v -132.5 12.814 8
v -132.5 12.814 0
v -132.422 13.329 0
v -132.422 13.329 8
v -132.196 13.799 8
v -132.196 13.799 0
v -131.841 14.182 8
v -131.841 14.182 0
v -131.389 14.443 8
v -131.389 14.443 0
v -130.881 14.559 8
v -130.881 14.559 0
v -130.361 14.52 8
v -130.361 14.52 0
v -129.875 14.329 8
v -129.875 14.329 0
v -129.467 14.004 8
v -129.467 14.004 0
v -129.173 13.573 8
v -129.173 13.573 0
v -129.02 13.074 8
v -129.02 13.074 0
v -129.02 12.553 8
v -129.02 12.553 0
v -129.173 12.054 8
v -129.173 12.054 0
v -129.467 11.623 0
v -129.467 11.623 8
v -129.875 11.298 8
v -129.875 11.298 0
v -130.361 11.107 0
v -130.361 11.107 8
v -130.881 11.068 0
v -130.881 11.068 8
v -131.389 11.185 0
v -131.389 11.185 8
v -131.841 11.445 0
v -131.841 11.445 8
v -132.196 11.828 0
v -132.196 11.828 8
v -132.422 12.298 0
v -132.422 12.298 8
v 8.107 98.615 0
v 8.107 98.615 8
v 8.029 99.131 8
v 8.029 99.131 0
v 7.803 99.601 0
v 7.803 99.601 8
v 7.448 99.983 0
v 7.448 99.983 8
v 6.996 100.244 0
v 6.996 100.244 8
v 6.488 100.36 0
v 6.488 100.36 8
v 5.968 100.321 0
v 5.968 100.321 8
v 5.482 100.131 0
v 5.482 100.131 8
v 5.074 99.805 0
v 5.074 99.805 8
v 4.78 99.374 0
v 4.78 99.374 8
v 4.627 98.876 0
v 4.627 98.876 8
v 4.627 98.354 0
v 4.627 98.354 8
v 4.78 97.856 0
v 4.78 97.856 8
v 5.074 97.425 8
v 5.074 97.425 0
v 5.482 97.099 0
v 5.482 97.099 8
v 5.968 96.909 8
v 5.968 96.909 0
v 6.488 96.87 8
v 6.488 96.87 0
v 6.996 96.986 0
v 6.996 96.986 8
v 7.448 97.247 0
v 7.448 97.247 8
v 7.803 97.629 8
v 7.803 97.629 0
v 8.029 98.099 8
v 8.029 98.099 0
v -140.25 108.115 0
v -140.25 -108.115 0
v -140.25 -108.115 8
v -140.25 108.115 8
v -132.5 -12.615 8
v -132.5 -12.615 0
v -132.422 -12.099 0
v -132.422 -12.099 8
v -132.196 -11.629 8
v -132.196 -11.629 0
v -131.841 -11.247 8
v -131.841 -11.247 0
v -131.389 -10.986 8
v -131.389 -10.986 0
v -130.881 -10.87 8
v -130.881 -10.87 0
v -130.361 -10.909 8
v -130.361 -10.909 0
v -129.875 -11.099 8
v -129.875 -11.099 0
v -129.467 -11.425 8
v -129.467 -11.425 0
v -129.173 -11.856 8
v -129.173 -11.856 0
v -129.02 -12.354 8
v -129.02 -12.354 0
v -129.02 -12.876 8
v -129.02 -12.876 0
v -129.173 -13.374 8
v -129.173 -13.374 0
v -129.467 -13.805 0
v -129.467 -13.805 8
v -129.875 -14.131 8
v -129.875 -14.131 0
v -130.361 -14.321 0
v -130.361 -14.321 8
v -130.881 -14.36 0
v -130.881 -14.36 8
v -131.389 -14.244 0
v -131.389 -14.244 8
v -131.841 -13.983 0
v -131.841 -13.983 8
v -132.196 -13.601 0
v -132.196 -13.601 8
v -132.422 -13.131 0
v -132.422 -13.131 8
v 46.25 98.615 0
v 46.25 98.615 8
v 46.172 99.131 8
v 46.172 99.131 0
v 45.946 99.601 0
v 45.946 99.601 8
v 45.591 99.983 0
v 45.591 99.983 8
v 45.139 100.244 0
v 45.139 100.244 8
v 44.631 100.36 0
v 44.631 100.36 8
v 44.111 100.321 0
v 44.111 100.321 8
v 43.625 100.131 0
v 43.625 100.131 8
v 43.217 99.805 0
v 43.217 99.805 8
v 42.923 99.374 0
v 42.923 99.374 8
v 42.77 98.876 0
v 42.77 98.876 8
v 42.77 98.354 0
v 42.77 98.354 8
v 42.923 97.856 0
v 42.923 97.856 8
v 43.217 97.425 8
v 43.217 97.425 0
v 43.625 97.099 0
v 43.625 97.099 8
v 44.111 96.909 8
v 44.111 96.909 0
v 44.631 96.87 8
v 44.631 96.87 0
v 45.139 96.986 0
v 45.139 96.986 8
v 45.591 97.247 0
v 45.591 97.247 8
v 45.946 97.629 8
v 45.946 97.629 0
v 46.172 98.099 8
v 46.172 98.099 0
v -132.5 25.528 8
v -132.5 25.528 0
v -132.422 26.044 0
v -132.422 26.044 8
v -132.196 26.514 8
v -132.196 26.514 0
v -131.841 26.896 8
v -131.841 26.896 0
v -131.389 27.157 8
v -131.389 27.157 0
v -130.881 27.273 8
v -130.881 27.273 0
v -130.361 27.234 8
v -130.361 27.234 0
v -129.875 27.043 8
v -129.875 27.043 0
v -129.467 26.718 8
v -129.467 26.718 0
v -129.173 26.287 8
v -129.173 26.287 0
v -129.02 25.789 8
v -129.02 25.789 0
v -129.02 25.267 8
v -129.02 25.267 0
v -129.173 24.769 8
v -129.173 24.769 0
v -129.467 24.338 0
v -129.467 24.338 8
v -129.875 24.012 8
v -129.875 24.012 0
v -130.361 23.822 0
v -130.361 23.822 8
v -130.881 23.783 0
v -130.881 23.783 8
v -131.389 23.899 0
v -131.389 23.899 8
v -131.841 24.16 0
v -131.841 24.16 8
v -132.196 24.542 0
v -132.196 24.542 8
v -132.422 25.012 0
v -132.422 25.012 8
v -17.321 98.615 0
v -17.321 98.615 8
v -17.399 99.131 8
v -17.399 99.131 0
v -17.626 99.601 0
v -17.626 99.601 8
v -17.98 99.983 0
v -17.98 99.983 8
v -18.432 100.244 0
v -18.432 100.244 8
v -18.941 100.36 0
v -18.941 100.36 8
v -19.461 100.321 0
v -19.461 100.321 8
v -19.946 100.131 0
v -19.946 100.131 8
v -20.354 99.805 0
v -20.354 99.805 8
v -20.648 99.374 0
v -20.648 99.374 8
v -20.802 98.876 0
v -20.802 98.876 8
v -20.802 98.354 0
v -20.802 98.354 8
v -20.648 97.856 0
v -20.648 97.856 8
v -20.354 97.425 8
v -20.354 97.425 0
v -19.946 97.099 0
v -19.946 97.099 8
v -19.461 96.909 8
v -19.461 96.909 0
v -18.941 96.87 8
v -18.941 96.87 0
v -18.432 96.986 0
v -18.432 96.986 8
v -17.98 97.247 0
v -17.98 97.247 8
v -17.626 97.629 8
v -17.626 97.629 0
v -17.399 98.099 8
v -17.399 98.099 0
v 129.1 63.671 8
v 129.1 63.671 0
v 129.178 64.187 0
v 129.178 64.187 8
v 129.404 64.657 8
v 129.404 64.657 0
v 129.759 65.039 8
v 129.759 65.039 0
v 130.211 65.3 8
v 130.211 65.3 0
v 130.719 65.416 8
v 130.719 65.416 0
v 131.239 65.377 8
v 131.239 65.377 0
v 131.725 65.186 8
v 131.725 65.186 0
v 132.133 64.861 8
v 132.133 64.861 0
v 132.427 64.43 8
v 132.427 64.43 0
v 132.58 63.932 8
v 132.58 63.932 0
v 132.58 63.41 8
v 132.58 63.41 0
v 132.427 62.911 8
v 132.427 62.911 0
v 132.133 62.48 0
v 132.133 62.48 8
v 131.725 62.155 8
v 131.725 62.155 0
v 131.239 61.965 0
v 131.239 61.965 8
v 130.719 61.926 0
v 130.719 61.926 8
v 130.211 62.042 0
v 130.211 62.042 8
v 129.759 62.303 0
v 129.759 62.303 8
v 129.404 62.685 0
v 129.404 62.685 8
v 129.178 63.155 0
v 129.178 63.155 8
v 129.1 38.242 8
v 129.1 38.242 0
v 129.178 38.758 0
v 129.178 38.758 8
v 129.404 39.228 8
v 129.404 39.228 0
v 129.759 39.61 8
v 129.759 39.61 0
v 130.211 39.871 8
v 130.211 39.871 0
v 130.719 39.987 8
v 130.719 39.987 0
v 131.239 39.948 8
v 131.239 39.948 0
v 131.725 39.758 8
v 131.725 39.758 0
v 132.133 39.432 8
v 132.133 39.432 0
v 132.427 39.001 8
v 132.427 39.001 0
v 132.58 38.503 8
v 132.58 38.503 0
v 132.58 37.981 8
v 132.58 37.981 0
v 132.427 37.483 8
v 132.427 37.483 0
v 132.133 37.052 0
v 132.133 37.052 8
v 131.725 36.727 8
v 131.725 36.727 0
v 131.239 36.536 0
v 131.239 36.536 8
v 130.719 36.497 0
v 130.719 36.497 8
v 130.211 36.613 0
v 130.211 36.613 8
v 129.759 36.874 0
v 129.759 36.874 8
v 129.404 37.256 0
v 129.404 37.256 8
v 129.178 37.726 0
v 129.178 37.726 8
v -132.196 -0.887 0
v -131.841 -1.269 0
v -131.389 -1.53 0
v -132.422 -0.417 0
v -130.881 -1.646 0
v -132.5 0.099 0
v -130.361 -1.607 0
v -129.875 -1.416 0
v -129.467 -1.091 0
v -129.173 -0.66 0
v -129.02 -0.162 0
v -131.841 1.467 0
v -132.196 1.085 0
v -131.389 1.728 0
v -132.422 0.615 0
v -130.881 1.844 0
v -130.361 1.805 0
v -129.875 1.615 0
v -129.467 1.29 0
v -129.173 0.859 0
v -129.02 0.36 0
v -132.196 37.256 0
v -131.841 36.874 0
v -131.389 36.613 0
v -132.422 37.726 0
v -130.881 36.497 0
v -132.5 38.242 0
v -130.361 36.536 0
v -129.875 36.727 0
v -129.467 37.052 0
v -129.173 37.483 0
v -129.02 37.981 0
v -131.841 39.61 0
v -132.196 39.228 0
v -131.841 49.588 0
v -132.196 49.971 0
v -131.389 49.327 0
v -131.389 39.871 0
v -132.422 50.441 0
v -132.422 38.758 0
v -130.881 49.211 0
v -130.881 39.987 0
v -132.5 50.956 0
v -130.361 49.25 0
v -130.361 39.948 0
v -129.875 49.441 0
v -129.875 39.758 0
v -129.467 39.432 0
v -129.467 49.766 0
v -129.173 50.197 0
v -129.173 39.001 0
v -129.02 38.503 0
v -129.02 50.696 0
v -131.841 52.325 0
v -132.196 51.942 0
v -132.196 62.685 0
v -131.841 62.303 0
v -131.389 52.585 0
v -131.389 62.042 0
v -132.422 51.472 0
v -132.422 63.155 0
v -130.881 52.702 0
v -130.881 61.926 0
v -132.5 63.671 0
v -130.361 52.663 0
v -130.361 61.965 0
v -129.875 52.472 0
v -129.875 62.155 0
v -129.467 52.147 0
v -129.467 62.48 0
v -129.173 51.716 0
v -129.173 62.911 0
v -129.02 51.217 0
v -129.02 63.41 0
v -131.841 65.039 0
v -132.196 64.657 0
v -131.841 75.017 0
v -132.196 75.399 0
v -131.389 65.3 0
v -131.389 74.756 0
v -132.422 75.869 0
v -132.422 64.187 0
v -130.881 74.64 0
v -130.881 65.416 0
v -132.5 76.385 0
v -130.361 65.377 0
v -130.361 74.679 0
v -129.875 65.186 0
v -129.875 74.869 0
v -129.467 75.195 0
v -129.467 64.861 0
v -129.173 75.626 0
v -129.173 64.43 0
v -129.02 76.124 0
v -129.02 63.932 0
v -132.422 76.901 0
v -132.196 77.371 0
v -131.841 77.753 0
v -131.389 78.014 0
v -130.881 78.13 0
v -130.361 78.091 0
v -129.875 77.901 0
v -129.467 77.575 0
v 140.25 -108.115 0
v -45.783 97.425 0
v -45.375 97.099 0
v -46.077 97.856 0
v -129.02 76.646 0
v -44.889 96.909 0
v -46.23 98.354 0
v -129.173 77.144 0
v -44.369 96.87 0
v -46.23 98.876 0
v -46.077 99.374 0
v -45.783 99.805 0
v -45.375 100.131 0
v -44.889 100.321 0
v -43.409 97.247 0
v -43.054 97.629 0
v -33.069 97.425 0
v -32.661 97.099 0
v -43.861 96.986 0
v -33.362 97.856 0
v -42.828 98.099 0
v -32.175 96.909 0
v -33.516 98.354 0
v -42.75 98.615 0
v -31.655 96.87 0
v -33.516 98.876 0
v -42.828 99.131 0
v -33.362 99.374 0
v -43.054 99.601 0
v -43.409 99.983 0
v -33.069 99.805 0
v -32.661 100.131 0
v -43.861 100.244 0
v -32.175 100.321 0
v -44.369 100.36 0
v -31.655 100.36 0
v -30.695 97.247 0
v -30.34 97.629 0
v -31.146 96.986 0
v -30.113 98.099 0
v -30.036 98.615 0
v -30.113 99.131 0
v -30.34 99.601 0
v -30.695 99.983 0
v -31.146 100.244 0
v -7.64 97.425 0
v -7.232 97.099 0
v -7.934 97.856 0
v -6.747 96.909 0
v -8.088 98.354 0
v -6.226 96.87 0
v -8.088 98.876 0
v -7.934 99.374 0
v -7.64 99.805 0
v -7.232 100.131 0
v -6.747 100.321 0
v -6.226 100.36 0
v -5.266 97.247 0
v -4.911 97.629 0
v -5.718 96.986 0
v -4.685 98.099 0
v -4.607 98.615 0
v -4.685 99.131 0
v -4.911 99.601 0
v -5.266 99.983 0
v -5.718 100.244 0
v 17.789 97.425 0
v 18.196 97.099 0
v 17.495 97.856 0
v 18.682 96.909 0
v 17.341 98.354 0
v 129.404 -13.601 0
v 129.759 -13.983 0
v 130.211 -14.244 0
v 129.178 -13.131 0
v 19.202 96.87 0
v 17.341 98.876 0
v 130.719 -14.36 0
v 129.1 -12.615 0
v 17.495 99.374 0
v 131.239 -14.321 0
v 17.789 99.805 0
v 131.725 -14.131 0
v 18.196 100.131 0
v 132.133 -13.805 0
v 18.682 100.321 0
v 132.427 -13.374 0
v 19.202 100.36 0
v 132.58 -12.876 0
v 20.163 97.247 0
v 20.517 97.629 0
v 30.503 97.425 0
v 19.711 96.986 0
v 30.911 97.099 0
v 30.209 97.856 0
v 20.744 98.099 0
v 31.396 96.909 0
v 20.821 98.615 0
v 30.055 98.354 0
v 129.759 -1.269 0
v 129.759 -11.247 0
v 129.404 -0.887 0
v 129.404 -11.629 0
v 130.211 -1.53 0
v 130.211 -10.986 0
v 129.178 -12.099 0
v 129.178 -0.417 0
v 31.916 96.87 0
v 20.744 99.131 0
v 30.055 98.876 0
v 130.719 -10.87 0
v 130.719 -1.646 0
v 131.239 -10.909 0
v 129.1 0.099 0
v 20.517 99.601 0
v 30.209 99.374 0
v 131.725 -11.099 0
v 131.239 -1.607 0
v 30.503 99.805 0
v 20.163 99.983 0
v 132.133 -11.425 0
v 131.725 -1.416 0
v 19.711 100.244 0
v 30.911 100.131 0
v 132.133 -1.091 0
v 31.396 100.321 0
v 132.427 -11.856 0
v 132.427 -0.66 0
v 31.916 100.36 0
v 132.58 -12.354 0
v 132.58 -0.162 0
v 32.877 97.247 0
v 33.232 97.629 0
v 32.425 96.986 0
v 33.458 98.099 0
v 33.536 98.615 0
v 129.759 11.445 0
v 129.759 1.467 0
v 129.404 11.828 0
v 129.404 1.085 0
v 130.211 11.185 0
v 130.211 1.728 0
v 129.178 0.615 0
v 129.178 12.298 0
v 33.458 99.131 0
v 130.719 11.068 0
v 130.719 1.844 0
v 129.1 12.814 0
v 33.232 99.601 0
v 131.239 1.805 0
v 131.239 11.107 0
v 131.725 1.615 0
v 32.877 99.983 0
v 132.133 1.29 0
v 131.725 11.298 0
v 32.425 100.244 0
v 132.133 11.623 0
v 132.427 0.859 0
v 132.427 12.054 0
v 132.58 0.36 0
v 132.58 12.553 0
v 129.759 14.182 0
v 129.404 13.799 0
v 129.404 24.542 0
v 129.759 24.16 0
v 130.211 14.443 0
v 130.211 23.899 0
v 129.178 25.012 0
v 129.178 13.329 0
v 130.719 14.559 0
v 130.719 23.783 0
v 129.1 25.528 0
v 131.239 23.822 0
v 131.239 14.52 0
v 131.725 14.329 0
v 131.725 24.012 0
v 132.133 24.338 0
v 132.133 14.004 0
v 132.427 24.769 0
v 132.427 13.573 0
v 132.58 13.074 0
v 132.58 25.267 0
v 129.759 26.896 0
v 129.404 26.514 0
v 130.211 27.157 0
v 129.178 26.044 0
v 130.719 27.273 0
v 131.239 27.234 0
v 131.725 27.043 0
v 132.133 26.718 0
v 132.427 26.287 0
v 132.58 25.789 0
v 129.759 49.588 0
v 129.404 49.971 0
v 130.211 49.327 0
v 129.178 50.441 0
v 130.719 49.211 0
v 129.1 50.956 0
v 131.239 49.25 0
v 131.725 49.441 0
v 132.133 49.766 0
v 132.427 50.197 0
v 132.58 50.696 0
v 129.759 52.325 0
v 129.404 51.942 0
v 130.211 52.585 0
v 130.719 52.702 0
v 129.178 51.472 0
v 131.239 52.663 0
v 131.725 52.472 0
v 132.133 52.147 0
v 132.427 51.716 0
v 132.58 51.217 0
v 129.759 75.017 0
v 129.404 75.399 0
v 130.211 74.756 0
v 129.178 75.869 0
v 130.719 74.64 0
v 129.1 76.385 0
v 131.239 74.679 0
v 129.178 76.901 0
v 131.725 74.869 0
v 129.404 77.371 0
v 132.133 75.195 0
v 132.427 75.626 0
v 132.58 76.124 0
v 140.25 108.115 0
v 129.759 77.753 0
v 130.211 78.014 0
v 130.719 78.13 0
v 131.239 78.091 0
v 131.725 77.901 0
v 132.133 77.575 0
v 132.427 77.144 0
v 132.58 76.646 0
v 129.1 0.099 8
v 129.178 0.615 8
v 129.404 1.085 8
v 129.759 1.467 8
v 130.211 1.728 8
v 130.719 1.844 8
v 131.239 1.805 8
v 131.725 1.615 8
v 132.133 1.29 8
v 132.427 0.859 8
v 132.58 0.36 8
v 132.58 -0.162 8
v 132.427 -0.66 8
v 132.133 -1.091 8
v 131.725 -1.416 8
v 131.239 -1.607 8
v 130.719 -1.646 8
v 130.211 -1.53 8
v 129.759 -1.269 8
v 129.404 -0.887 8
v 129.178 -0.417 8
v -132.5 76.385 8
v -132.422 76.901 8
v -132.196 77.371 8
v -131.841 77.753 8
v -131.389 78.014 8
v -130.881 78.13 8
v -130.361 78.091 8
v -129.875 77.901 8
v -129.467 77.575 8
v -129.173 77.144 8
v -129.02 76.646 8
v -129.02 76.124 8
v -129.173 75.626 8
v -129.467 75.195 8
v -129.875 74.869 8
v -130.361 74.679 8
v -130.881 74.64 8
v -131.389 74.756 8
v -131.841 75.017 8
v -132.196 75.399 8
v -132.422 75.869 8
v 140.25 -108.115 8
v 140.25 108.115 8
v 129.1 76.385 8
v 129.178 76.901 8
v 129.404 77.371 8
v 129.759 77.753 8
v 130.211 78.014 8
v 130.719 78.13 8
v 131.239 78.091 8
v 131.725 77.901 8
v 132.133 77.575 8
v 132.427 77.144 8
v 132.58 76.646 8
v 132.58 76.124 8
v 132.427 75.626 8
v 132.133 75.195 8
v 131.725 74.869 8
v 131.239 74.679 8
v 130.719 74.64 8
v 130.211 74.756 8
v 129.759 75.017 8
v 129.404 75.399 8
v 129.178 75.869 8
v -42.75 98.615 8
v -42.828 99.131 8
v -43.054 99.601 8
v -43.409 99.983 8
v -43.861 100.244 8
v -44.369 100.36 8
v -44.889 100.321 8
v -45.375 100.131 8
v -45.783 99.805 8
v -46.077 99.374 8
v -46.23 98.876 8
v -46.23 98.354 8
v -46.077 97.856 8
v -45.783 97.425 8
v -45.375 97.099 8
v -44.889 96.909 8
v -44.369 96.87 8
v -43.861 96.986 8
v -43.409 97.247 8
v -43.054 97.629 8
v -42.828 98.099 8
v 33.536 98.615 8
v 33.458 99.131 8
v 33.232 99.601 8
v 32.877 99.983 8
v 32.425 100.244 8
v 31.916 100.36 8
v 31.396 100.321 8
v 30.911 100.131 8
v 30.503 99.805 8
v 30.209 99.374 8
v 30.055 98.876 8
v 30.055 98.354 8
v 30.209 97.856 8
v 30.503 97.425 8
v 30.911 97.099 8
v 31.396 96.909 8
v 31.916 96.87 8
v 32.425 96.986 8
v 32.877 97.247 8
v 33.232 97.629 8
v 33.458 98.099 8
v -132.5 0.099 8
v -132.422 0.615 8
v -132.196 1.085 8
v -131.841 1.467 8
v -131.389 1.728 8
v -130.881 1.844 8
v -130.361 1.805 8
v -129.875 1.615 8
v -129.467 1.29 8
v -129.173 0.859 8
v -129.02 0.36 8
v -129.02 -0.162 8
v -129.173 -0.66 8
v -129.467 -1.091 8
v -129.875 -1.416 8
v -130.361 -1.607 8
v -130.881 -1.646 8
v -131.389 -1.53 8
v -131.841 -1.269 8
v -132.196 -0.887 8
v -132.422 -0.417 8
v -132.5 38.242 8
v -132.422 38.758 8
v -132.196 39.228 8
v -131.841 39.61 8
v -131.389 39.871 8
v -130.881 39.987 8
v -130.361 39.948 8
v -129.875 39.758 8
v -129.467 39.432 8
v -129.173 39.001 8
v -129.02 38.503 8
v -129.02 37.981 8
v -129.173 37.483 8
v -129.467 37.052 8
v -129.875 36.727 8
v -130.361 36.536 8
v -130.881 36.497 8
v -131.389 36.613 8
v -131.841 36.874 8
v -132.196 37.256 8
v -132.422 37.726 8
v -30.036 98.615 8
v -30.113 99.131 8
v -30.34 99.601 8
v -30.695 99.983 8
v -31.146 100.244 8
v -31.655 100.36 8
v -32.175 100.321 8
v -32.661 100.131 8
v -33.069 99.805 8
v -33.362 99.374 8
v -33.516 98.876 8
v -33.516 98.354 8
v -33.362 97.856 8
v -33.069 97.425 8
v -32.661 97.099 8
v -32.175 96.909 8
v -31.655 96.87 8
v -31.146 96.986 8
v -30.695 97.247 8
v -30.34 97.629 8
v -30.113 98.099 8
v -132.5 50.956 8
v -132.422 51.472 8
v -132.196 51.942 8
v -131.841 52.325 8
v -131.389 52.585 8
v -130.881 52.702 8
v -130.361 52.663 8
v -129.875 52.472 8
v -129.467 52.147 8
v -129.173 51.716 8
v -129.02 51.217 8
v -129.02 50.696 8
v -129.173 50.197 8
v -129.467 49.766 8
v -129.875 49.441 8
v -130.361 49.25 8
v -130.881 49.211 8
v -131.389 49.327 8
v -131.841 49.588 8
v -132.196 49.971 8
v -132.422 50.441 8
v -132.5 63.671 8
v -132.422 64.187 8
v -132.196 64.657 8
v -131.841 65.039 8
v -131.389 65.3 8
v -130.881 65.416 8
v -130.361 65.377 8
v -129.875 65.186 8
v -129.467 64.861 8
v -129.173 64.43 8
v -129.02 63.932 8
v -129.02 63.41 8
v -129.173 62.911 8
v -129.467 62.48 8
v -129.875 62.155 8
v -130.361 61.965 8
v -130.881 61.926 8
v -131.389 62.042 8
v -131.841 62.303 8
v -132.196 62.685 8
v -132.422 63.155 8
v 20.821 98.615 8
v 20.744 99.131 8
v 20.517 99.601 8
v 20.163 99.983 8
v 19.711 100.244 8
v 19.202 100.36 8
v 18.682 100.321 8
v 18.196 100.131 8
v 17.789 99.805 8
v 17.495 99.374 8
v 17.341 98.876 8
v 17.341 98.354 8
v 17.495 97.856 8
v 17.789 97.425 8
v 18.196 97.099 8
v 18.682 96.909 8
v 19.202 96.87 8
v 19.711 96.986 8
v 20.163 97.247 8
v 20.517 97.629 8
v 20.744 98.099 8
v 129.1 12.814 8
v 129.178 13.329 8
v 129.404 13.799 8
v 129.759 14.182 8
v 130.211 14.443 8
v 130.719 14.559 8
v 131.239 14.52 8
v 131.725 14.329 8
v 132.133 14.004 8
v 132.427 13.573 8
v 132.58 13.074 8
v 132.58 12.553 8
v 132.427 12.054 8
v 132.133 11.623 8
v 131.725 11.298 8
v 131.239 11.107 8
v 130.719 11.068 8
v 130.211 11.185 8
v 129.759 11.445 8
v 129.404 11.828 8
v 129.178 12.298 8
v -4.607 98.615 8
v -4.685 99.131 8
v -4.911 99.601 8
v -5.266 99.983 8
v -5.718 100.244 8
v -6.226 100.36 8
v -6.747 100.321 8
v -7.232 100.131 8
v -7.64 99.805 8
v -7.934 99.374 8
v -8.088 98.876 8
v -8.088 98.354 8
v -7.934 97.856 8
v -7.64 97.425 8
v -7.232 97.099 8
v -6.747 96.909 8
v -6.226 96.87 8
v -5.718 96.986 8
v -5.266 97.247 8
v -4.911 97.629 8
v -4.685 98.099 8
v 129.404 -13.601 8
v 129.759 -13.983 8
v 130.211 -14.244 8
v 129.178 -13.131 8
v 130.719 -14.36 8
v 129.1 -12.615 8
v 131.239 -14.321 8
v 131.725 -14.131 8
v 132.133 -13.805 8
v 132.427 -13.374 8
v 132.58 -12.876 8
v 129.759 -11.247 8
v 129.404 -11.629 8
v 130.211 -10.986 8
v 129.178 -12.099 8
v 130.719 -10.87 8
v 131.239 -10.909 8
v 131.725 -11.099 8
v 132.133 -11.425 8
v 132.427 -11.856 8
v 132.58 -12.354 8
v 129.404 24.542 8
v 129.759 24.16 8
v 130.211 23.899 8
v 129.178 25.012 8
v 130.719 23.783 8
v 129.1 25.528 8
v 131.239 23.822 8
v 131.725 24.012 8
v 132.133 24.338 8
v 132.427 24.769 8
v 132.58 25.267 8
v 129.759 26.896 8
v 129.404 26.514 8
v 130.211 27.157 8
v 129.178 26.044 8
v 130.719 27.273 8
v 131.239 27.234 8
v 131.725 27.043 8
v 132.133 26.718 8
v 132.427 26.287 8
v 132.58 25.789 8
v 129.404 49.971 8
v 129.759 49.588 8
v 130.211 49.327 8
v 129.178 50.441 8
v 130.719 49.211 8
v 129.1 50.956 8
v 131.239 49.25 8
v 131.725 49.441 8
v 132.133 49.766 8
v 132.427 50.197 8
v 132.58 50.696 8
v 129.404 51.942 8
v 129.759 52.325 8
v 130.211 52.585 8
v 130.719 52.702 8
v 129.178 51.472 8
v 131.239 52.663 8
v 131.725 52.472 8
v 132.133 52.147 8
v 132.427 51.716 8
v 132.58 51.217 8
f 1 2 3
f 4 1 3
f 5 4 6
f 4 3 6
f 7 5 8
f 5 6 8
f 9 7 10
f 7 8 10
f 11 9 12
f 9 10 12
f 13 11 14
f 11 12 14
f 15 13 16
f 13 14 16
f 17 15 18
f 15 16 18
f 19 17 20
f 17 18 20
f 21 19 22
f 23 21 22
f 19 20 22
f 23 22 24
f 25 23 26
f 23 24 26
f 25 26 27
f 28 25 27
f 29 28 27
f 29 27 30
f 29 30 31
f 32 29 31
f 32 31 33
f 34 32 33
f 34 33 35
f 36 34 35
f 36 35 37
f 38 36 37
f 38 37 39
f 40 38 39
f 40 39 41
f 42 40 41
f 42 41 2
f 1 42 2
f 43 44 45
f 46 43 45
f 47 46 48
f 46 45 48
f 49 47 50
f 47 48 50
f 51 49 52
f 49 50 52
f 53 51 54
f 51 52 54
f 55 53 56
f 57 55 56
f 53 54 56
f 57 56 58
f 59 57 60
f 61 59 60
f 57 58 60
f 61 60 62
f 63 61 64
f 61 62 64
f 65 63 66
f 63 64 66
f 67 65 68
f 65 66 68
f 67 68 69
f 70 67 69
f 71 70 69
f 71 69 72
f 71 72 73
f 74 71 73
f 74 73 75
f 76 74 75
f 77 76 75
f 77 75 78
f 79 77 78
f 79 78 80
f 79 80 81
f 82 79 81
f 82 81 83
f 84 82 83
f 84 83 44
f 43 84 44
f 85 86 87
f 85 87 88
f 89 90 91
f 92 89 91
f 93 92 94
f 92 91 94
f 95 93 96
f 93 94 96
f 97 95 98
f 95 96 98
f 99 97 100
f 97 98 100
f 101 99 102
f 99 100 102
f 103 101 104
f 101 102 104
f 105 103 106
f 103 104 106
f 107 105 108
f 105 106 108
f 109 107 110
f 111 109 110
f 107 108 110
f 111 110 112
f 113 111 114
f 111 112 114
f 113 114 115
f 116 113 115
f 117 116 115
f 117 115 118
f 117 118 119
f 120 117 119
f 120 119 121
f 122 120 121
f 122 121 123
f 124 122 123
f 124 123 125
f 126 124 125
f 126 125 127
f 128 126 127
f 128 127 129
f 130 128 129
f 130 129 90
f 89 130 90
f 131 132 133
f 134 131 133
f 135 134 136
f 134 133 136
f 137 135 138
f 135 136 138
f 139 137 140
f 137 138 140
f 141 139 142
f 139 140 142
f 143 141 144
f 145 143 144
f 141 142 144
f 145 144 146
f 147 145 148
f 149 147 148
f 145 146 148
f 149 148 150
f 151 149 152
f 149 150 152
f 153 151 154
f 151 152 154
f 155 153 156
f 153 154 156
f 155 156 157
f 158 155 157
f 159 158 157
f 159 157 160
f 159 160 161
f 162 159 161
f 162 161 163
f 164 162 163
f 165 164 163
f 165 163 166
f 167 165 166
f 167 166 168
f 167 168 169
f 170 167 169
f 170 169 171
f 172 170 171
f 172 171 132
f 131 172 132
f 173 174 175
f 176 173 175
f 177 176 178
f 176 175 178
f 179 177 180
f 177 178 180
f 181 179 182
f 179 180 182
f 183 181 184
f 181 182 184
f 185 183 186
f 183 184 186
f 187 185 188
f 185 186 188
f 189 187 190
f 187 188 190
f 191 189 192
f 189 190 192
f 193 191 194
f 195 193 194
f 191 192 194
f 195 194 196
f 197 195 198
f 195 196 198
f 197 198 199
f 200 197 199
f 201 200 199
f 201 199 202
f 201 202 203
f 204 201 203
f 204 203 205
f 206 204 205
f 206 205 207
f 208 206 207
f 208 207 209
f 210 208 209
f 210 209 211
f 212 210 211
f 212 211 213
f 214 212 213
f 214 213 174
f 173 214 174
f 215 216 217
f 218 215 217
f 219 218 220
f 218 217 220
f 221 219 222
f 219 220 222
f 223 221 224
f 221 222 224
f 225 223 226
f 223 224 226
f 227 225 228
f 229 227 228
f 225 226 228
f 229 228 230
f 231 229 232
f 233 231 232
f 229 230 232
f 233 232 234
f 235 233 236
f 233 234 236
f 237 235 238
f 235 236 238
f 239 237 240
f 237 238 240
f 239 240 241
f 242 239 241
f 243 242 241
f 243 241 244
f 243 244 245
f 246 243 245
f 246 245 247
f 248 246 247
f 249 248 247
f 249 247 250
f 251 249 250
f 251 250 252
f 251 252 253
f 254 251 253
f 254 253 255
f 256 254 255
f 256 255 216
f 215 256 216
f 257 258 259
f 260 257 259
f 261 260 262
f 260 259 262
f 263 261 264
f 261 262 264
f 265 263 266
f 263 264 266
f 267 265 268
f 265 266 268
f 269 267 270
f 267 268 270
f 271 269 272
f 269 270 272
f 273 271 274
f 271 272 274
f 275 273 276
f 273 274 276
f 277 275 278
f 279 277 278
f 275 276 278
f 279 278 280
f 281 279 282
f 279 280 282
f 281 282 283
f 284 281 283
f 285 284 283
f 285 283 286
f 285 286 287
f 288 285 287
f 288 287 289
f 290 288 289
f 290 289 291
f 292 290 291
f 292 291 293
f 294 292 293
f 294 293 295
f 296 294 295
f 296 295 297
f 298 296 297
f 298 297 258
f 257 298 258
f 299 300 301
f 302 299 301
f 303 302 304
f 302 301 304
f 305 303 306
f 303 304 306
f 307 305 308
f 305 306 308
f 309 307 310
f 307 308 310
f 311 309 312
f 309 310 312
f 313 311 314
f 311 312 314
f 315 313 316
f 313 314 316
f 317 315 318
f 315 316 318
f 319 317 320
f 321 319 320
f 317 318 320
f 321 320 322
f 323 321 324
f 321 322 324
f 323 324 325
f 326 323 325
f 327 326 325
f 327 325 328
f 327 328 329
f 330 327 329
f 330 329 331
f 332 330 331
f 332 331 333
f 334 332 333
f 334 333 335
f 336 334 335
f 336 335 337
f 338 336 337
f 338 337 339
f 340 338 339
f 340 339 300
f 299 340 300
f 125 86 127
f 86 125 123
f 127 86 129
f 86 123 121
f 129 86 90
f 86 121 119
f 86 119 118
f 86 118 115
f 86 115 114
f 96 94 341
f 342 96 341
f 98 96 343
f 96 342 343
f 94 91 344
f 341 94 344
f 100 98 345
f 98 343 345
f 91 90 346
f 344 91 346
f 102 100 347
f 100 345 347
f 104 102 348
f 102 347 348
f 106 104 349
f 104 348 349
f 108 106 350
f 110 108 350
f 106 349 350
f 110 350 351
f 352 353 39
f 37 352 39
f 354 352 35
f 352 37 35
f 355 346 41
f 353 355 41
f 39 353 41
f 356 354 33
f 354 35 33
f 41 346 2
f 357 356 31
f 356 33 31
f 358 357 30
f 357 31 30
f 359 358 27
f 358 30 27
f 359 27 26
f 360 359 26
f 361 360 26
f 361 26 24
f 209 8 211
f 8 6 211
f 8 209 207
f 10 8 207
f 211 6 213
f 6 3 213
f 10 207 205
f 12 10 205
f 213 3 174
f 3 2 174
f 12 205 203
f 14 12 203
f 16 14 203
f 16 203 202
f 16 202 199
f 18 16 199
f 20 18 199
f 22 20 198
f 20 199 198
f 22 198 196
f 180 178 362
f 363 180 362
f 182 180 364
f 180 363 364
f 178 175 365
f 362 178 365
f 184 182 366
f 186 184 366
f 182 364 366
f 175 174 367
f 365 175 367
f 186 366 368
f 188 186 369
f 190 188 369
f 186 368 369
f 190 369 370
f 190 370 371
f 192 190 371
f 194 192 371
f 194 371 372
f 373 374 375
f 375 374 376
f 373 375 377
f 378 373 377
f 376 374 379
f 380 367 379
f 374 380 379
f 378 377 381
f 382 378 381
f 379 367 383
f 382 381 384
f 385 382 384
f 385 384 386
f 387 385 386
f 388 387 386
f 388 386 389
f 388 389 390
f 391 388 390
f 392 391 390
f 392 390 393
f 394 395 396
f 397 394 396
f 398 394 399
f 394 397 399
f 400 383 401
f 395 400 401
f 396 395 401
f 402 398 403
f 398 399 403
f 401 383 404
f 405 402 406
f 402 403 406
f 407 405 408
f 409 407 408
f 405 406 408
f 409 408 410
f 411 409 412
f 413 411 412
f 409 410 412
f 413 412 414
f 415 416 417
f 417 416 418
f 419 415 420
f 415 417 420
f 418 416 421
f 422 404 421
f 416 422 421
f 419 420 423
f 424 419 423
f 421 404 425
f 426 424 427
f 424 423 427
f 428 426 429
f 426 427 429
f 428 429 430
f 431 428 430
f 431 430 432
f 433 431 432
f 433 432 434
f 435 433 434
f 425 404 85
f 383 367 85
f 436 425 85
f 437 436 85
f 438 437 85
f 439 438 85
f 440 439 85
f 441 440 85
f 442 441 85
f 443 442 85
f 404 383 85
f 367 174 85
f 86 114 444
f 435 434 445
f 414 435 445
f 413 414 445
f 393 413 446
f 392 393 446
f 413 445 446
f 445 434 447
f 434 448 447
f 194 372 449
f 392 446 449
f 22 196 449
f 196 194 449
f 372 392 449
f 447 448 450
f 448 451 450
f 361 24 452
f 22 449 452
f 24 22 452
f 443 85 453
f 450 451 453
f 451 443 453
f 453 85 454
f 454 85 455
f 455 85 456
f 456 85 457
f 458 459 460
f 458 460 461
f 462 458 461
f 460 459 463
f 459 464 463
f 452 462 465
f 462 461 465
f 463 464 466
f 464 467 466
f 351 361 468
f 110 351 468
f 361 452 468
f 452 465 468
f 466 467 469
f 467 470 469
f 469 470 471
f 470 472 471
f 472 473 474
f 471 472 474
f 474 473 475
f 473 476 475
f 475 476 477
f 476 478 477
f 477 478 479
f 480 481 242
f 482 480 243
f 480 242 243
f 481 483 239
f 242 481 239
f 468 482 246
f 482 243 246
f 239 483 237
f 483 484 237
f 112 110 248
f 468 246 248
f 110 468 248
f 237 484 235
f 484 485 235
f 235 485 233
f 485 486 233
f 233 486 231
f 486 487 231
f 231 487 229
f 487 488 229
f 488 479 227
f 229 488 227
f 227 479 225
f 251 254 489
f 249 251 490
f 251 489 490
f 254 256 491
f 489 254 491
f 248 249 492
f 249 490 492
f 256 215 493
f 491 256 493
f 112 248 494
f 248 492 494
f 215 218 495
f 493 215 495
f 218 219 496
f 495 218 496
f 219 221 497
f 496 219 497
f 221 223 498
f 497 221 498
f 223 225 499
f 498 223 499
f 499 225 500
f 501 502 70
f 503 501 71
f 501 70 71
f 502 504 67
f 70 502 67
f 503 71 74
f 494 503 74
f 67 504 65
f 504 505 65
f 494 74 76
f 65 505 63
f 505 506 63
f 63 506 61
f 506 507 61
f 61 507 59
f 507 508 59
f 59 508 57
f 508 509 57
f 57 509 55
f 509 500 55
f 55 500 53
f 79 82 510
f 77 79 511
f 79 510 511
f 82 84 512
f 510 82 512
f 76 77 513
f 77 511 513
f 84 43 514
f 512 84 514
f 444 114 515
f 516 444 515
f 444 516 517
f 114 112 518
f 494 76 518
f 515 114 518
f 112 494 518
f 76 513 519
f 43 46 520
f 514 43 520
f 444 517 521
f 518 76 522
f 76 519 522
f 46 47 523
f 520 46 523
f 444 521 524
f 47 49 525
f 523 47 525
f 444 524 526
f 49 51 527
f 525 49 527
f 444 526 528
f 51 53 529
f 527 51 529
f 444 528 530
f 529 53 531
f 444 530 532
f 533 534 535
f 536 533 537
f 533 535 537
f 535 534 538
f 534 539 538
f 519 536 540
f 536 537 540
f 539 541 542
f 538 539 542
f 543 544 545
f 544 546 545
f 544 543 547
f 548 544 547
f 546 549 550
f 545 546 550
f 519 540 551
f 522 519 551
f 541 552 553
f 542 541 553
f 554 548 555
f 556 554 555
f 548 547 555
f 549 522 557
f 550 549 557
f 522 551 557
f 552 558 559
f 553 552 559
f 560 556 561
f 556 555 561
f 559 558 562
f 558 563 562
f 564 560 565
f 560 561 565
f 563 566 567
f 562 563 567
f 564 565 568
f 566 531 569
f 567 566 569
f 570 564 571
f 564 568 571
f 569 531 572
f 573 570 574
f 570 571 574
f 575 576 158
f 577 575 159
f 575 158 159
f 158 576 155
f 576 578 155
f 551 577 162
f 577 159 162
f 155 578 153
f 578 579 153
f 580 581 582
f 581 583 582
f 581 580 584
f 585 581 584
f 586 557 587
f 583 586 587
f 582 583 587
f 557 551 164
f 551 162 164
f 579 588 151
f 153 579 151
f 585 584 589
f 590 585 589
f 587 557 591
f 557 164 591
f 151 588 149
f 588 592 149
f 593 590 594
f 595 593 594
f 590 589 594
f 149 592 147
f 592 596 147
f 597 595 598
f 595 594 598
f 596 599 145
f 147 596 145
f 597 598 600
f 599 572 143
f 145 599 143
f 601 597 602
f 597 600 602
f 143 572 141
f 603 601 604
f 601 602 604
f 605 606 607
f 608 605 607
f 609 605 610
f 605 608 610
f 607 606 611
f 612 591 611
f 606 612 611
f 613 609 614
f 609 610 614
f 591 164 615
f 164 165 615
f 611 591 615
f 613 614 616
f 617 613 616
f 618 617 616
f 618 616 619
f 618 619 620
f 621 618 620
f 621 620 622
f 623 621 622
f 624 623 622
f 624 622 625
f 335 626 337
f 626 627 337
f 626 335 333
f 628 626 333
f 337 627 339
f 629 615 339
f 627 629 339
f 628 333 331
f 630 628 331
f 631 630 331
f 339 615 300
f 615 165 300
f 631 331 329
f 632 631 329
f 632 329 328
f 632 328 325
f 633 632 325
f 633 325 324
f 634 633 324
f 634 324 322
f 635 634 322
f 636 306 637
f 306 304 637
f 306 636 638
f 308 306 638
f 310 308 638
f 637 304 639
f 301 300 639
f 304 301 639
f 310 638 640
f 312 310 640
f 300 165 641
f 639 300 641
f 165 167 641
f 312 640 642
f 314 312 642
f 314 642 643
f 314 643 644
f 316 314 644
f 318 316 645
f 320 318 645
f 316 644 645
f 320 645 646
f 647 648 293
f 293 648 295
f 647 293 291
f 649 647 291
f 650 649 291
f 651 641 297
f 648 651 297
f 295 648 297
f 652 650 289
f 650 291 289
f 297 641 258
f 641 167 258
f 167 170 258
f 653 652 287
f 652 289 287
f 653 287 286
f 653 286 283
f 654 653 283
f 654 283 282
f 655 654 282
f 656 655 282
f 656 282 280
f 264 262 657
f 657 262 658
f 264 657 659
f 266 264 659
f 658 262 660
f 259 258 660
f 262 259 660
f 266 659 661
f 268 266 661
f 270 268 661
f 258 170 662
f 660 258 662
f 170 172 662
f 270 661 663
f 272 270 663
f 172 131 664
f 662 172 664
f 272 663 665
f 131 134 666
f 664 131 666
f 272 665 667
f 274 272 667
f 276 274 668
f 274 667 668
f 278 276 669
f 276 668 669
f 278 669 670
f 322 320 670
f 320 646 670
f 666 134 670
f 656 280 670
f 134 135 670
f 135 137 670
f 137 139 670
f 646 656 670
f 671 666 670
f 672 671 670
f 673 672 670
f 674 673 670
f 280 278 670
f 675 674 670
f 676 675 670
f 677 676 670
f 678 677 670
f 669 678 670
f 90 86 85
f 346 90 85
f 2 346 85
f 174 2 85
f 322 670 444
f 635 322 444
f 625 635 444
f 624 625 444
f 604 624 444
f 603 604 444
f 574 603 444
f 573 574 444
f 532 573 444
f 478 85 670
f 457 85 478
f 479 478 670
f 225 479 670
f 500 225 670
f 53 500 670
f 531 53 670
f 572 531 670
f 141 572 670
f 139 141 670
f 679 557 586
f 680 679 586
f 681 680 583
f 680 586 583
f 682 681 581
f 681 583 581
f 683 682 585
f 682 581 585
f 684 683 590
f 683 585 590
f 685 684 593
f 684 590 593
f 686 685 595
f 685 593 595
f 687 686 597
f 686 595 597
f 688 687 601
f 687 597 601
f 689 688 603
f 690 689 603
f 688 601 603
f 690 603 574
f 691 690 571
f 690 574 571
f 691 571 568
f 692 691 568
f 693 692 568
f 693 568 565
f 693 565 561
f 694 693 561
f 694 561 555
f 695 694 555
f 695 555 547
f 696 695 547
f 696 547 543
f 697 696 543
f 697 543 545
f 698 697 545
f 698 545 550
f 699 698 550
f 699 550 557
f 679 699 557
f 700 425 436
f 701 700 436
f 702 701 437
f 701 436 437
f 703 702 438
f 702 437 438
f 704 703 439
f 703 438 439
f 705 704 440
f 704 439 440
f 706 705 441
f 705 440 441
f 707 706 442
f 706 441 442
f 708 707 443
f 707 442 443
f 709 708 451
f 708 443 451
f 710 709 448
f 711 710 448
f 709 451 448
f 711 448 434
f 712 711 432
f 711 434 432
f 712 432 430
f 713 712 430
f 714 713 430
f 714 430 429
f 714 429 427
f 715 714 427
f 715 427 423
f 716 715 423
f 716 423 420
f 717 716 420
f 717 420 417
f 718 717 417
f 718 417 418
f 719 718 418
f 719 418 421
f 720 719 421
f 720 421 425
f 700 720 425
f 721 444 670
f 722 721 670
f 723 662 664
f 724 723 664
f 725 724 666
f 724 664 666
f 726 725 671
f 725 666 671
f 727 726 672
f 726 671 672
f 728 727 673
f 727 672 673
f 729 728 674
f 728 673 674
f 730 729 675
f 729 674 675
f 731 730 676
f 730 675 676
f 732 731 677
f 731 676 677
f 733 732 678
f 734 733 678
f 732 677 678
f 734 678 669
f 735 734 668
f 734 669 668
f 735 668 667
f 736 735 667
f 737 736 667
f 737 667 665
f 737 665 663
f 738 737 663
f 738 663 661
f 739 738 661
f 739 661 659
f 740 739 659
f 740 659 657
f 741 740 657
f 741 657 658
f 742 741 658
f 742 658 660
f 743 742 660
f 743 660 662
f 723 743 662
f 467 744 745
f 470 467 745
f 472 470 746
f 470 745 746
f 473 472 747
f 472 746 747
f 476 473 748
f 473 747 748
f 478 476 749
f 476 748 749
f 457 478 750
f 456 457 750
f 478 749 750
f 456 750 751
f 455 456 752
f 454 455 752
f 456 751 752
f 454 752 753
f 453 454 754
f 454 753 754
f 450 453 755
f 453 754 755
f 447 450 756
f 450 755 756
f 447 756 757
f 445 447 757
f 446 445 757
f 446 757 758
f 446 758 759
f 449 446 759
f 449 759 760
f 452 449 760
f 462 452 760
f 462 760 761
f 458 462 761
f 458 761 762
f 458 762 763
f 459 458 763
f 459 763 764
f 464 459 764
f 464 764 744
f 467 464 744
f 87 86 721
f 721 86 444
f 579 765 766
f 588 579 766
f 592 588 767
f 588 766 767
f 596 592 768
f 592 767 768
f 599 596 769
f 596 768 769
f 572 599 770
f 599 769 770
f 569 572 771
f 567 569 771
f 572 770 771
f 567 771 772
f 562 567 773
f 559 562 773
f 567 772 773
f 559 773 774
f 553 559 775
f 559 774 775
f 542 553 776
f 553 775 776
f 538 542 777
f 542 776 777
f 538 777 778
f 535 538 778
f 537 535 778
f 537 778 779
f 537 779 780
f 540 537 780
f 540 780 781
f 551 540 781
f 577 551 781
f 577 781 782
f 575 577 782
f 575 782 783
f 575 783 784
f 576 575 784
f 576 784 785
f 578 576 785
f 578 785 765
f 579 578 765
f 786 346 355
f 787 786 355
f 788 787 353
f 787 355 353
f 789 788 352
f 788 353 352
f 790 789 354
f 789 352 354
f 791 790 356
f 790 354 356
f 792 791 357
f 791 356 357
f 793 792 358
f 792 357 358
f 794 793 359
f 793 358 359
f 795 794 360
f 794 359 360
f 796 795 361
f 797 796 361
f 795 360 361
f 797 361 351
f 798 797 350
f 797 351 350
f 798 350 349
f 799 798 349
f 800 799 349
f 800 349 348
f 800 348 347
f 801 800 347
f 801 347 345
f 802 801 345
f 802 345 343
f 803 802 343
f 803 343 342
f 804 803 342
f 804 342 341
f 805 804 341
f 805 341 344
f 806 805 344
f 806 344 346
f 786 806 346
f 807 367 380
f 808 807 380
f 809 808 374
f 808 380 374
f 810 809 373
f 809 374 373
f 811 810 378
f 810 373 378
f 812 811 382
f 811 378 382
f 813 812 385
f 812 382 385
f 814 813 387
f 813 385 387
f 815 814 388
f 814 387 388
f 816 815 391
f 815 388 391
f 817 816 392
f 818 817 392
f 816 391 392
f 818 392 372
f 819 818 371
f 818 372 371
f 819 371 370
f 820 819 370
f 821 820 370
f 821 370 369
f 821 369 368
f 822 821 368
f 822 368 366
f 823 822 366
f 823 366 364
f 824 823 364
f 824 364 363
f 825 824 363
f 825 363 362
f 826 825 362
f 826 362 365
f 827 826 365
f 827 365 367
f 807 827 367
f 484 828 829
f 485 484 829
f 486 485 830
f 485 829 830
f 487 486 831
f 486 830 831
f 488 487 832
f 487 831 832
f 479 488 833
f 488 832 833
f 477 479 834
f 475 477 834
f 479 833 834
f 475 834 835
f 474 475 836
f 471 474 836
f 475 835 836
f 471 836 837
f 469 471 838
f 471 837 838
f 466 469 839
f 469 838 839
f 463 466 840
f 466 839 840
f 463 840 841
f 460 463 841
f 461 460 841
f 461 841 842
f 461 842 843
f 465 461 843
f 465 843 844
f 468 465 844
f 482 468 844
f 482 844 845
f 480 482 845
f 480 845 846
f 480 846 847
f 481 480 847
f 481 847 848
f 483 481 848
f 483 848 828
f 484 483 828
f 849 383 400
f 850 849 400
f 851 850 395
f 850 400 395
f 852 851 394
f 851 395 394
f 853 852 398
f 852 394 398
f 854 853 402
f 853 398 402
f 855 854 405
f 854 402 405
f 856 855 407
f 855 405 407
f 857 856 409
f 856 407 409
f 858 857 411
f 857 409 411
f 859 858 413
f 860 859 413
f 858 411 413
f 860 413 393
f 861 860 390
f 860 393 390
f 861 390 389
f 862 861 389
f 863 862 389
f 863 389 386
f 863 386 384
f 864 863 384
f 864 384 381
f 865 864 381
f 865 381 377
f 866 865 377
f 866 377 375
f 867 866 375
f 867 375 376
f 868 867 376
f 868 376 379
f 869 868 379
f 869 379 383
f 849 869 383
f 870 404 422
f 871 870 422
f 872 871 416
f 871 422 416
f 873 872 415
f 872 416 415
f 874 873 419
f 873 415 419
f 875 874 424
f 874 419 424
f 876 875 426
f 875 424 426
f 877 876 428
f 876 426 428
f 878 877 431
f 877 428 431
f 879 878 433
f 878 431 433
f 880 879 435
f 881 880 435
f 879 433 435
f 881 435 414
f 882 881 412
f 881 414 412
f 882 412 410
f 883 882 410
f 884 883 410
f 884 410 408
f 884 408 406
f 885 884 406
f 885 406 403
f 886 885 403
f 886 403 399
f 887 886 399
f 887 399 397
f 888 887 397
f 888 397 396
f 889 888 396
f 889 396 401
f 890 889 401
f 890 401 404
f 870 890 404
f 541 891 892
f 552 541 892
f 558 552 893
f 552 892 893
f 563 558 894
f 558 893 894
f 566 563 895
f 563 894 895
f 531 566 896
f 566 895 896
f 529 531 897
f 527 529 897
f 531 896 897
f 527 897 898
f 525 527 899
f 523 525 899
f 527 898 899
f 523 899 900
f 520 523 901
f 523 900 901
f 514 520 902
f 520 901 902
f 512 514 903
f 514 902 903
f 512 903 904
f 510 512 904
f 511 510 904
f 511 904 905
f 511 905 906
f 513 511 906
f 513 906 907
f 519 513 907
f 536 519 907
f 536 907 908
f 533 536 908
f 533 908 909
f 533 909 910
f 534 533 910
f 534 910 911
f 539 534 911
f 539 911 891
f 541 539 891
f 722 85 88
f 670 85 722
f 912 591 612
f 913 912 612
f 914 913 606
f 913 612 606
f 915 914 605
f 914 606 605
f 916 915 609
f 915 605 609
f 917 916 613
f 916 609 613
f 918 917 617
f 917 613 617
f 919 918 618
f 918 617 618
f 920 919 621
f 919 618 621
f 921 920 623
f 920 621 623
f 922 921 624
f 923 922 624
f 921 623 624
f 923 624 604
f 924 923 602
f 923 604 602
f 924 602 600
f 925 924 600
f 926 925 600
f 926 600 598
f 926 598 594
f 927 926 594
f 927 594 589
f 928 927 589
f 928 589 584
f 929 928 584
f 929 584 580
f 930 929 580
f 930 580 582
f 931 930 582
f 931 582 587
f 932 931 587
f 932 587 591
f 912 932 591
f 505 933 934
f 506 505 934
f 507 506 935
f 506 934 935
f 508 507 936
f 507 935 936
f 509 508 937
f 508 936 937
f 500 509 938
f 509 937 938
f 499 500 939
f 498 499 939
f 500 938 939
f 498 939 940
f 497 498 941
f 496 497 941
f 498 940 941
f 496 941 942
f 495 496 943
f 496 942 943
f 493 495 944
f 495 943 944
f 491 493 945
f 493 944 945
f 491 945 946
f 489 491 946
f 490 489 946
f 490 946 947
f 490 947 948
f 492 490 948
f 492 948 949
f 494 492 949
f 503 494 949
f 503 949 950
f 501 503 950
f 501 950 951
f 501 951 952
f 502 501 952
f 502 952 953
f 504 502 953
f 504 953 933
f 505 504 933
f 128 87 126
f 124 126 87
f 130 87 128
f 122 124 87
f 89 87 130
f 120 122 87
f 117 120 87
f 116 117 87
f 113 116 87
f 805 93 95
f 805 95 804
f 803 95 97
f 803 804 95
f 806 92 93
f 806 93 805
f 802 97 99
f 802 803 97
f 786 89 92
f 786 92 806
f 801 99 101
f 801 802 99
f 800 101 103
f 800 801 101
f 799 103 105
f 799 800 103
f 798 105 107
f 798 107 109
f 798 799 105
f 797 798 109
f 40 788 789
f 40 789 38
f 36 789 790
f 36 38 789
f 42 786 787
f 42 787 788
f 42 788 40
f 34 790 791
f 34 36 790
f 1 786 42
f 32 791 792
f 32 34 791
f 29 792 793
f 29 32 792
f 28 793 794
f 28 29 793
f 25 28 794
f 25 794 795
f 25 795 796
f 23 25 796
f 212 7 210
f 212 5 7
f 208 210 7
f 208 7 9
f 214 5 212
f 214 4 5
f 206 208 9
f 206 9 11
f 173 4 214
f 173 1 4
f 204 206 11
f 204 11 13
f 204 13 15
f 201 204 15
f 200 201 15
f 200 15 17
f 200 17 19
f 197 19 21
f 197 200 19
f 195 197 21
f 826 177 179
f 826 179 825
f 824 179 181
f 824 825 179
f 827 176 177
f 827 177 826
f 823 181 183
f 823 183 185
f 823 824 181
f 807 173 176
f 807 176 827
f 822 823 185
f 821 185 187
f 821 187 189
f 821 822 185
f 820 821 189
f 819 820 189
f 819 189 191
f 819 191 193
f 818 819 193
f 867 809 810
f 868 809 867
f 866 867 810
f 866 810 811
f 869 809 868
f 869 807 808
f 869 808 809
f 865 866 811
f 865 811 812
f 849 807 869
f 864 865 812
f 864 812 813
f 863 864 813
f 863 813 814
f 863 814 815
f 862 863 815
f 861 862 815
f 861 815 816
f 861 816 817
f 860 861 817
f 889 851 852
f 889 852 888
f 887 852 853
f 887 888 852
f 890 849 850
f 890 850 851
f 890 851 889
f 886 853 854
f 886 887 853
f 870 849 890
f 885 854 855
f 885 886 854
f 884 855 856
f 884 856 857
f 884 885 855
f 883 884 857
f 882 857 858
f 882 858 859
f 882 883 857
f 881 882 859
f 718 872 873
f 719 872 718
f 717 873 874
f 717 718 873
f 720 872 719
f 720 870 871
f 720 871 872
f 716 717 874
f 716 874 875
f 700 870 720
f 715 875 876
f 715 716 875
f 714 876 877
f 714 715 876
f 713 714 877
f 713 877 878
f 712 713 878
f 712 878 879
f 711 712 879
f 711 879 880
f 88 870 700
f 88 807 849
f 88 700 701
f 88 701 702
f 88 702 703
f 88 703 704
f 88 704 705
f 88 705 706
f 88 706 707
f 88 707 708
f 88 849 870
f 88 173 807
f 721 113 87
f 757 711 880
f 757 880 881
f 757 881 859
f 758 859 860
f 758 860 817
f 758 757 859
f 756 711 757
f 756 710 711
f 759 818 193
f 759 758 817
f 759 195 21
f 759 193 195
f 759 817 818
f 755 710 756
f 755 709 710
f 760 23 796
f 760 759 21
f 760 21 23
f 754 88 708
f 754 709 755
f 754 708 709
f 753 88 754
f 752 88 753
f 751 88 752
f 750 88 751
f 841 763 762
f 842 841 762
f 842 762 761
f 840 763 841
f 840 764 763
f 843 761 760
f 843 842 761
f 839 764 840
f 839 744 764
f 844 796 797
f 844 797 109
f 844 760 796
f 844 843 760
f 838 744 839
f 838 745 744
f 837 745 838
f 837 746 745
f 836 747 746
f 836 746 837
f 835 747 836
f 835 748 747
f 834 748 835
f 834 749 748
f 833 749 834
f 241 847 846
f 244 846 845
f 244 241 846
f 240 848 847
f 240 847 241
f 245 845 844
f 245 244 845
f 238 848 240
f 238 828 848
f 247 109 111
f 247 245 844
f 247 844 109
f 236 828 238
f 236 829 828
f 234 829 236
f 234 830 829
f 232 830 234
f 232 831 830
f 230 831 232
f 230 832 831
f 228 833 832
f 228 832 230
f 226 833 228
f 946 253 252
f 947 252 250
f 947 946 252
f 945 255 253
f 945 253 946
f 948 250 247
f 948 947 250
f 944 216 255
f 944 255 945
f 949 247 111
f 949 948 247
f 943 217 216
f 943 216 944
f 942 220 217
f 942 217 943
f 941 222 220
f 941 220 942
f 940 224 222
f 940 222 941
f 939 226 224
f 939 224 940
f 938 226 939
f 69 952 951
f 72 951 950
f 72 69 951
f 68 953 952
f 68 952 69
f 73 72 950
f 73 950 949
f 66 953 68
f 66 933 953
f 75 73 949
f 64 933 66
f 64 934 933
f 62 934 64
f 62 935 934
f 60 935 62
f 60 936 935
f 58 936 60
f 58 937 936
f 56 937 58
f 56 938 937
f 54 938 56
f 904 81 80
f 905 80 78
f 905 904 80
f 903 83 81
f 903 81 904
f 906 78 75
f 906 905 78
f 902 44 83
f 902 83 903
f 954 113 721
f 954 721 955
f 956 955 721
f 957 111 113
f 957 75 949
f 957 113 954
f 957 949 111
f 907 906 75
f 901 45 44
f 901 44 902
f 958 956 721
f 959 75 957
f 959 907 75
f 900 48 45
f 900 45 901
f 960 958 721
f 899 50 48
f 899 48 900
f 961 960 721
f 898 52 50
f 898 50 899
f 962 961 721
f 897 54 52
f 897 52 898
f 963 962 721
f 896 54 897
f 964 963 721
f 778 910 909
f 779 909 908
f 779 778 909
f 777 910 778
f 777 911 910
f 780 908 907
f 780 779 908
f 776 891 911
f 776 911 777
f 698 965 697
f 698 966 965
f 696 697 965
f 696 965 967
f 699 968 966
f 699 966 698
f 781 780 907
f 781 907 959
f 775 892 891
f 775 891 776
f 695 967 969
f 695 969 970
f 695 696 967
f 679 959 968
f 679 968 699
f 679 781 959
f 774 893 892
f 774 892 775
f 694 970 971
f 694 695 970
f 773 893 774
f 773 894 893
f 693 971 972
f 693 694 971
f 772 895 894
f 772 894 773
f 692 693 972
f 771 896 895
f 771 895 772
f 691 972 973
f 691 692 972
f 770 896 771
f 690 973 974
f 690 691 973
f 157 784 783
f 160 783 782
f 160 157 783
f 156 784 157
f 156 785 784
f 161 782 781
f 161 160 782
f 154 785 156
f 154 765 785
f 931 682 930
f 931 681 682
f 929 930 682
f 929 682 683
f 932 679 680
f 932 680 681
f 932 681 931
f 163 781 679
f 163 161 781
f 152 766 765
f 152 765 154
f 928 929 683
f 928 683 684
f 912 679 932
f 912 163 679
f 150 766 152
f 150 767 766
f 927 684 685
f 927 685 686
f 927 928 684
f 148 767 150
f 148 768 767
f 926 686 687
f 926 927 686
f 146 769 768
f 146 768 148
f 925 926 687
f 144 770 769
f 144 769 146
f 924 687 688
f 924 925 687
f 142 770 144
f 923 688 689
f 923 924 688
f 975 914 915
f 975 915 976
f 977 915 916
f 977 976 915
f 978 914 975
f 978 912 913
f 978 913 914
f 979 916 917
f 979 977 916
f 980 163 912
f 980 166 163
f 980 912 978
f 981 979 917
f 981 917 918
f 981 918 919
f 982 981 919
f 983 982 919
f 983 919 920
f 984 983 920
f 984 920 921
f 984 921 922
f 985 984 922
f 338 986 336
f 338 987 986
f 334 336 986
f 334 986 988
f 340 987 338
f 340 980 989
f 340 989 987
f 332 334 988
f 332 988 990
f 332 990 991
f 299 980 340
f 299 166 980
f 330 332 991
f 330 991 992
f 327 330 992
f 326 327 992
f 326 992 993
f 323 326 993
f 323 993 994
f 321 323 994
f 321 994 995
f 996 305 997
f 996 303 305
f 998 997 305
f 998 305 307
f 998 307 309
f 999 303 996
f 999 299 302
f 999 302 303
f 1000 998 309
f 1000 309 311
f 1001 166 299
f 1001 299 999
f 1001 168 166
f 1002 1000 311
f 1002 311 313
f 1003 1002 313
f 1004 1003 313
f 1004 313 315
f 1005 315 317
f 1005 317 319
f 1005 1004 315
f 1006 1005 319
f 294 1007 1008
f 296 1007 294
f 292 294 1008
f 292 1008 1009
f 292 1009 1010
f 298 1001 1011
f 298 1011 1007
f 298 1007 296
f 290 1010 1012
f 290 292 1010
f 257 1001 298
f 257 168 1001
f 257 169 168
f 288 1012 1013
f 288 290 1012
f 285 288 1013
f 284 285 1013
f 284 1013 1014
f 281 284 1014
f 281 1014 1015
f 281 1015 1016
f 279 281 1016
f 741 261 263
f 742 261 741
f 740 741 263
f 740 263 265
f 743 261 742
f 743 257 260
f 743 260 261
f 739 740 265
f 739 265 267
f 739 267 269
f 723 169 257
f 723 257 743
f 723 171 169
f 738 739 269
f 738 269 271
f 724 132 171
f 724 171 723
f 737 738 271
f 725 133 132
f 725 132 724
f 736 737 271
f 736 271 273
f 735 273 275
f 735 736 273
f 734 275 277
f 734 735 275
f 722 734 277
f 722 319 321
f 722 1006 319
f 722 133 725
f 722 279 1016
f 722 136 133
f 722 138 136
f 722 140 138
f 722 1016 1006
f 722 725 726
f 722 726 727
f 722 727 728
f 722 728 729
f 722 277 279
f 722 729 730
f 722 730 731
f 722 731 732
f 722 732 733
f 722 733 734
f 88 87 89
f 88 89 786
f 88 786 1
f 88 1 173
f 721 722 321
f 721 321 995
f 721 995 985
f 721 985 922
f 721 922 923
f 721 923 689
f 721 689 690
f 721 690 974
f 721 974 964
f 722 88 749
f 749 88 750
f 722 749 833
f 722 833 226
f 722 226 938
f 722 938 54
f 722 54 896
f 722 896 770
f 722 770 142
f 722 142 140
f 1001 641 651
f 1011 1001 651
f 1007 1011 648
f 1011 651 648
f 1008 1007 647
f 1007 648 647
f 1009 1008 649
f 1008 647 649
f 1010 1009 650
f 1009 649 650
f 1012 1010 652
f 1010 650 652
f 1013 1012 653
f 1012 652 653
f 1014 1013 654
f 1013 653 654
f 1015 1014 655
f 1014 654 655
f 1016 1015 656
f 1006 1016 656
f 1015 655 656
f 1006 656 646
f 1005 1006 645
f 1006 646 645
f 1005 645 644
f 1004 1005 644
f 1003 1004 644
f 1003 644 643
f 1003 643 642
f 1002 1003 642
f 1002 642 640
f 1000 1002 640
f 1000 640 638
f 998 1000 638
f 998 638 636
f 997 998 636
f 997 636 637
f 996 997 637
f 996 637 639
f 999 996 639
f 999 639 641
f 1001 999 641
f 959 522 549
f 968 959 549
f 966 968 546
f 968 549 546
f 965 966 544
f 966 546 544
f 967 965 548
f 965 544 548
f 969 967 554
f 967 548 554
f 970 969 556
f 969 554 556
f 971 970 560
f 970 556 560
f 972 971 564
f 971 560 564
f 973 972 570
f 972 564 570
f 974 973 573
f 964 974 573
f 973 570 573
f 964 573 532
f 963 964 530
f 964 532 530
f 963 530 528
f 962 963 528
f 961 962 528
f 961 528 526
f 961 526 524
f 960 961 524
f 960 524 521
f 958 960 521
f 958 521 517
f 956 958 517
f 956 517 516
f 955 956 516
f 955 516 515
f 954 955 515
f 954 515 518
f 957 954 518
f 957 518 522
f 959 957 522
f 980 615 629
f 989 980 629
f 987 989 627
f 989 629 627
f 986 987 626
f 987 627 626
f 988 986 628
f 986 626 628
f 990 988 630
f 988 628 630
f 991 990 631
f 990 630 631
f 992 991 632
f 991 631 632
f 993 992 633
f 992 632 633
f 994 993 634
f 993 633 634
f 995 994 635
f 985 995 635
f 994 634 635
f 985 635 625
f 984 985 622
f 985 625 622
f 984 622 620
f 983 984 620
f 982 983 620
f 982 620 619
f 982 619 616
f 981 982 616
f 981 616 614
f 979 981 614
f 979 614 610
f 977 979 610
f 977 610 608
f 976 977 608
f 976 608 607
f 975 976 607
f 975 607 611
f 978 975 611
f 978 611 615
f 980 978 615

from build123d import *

# Parameters (mm, degrees)
ESBO_O1_W                 = 280.5
ESBO_O1_H                 = 216.23
RESSALTO_EXTRUS_O1_DEPTH  = 8
ESBO_O2_R                 = 1.75
CORTE_EXTRUS_O1_DEPTH     = 100
PADR_O_LINEAR1_COUNT      = 8
PADR_O_LINEAR1_PITCH      = 12.714285714
ESBO_O3_R                 = 1.75
CORTE_EXTRUS_O2_DEPTH     = 10
PADR_O_LINEAR2_COUNT      = 8
PADR_O_LINEAR2_PITCH      = 12.714285714
PADR_O_LINEAR2_COUNT_DIR2 = 2
PADR_O_LINEAR2_PITCH_DIR2 = 261.6


with BuildPart() as part:
    # Esboço1 → Ressalto-extrusão1 (new body)
    with BuildSketch(Plane.XY):
        Rectangle(ESBO_O1_W, ESBO_O1_H)
    extrude(amount=RESSALTO_EXTRUS_O1_DEPTH)

    # Esboço2 → Corte-extrusão1 (cut)
    with BuildSketch(Plane.XY.offset(8)):
        with Locations((44.5, 98.615)):
            Circle(ESBO_O2_R)
    corte_extrus_o1 = extrude(amount=-CORTE_EXTRUS_O1_DEPTH, mode=Mode.SUBTRACT)

    # Padrão linear1: Corte-extrusão1 ×8
    with Locations(*[(-i * PADR_O_LINEAR1_PITCH, 0, 0) for i in range(1, PADR_O_LINEAR1_COUNT)]):
        add(corte_extrus_o1, mode=Mode.SUBTRACT)

    # Esboço3 → Corte-extrusão2 (cut)
    with BuildSketch(Plane(origin=(0, 0, 0), x_dir=(-1, 0, 0), z_dir=(0, 0, -1))):
        with Locations((130.75, 76.385)):
            Circle(ESBO_O3_R)
    corte_extrus_o2 = extrude(amount=-CORTE_EXTRUS_O2_DEPTH, mode=Mode.SUBTRACT)

    # Padrão linear2: Corte-extrus_o2 8 × 2
    with Locations(*[(j * PADR_O_LINEAR2_PITCH_DIR2, -i * PADR_O_LINEAR2_PITCH, 0) for i in range(PADR_O_LINEAR2_COUNT) for j in range(PADR_O_LINEAR2_COUNT_DIR2) if (i, j) != (0, 0)]):
        add(corte_extrus_o2, mode=Mode.SUBTRACT)


solid = part.part
